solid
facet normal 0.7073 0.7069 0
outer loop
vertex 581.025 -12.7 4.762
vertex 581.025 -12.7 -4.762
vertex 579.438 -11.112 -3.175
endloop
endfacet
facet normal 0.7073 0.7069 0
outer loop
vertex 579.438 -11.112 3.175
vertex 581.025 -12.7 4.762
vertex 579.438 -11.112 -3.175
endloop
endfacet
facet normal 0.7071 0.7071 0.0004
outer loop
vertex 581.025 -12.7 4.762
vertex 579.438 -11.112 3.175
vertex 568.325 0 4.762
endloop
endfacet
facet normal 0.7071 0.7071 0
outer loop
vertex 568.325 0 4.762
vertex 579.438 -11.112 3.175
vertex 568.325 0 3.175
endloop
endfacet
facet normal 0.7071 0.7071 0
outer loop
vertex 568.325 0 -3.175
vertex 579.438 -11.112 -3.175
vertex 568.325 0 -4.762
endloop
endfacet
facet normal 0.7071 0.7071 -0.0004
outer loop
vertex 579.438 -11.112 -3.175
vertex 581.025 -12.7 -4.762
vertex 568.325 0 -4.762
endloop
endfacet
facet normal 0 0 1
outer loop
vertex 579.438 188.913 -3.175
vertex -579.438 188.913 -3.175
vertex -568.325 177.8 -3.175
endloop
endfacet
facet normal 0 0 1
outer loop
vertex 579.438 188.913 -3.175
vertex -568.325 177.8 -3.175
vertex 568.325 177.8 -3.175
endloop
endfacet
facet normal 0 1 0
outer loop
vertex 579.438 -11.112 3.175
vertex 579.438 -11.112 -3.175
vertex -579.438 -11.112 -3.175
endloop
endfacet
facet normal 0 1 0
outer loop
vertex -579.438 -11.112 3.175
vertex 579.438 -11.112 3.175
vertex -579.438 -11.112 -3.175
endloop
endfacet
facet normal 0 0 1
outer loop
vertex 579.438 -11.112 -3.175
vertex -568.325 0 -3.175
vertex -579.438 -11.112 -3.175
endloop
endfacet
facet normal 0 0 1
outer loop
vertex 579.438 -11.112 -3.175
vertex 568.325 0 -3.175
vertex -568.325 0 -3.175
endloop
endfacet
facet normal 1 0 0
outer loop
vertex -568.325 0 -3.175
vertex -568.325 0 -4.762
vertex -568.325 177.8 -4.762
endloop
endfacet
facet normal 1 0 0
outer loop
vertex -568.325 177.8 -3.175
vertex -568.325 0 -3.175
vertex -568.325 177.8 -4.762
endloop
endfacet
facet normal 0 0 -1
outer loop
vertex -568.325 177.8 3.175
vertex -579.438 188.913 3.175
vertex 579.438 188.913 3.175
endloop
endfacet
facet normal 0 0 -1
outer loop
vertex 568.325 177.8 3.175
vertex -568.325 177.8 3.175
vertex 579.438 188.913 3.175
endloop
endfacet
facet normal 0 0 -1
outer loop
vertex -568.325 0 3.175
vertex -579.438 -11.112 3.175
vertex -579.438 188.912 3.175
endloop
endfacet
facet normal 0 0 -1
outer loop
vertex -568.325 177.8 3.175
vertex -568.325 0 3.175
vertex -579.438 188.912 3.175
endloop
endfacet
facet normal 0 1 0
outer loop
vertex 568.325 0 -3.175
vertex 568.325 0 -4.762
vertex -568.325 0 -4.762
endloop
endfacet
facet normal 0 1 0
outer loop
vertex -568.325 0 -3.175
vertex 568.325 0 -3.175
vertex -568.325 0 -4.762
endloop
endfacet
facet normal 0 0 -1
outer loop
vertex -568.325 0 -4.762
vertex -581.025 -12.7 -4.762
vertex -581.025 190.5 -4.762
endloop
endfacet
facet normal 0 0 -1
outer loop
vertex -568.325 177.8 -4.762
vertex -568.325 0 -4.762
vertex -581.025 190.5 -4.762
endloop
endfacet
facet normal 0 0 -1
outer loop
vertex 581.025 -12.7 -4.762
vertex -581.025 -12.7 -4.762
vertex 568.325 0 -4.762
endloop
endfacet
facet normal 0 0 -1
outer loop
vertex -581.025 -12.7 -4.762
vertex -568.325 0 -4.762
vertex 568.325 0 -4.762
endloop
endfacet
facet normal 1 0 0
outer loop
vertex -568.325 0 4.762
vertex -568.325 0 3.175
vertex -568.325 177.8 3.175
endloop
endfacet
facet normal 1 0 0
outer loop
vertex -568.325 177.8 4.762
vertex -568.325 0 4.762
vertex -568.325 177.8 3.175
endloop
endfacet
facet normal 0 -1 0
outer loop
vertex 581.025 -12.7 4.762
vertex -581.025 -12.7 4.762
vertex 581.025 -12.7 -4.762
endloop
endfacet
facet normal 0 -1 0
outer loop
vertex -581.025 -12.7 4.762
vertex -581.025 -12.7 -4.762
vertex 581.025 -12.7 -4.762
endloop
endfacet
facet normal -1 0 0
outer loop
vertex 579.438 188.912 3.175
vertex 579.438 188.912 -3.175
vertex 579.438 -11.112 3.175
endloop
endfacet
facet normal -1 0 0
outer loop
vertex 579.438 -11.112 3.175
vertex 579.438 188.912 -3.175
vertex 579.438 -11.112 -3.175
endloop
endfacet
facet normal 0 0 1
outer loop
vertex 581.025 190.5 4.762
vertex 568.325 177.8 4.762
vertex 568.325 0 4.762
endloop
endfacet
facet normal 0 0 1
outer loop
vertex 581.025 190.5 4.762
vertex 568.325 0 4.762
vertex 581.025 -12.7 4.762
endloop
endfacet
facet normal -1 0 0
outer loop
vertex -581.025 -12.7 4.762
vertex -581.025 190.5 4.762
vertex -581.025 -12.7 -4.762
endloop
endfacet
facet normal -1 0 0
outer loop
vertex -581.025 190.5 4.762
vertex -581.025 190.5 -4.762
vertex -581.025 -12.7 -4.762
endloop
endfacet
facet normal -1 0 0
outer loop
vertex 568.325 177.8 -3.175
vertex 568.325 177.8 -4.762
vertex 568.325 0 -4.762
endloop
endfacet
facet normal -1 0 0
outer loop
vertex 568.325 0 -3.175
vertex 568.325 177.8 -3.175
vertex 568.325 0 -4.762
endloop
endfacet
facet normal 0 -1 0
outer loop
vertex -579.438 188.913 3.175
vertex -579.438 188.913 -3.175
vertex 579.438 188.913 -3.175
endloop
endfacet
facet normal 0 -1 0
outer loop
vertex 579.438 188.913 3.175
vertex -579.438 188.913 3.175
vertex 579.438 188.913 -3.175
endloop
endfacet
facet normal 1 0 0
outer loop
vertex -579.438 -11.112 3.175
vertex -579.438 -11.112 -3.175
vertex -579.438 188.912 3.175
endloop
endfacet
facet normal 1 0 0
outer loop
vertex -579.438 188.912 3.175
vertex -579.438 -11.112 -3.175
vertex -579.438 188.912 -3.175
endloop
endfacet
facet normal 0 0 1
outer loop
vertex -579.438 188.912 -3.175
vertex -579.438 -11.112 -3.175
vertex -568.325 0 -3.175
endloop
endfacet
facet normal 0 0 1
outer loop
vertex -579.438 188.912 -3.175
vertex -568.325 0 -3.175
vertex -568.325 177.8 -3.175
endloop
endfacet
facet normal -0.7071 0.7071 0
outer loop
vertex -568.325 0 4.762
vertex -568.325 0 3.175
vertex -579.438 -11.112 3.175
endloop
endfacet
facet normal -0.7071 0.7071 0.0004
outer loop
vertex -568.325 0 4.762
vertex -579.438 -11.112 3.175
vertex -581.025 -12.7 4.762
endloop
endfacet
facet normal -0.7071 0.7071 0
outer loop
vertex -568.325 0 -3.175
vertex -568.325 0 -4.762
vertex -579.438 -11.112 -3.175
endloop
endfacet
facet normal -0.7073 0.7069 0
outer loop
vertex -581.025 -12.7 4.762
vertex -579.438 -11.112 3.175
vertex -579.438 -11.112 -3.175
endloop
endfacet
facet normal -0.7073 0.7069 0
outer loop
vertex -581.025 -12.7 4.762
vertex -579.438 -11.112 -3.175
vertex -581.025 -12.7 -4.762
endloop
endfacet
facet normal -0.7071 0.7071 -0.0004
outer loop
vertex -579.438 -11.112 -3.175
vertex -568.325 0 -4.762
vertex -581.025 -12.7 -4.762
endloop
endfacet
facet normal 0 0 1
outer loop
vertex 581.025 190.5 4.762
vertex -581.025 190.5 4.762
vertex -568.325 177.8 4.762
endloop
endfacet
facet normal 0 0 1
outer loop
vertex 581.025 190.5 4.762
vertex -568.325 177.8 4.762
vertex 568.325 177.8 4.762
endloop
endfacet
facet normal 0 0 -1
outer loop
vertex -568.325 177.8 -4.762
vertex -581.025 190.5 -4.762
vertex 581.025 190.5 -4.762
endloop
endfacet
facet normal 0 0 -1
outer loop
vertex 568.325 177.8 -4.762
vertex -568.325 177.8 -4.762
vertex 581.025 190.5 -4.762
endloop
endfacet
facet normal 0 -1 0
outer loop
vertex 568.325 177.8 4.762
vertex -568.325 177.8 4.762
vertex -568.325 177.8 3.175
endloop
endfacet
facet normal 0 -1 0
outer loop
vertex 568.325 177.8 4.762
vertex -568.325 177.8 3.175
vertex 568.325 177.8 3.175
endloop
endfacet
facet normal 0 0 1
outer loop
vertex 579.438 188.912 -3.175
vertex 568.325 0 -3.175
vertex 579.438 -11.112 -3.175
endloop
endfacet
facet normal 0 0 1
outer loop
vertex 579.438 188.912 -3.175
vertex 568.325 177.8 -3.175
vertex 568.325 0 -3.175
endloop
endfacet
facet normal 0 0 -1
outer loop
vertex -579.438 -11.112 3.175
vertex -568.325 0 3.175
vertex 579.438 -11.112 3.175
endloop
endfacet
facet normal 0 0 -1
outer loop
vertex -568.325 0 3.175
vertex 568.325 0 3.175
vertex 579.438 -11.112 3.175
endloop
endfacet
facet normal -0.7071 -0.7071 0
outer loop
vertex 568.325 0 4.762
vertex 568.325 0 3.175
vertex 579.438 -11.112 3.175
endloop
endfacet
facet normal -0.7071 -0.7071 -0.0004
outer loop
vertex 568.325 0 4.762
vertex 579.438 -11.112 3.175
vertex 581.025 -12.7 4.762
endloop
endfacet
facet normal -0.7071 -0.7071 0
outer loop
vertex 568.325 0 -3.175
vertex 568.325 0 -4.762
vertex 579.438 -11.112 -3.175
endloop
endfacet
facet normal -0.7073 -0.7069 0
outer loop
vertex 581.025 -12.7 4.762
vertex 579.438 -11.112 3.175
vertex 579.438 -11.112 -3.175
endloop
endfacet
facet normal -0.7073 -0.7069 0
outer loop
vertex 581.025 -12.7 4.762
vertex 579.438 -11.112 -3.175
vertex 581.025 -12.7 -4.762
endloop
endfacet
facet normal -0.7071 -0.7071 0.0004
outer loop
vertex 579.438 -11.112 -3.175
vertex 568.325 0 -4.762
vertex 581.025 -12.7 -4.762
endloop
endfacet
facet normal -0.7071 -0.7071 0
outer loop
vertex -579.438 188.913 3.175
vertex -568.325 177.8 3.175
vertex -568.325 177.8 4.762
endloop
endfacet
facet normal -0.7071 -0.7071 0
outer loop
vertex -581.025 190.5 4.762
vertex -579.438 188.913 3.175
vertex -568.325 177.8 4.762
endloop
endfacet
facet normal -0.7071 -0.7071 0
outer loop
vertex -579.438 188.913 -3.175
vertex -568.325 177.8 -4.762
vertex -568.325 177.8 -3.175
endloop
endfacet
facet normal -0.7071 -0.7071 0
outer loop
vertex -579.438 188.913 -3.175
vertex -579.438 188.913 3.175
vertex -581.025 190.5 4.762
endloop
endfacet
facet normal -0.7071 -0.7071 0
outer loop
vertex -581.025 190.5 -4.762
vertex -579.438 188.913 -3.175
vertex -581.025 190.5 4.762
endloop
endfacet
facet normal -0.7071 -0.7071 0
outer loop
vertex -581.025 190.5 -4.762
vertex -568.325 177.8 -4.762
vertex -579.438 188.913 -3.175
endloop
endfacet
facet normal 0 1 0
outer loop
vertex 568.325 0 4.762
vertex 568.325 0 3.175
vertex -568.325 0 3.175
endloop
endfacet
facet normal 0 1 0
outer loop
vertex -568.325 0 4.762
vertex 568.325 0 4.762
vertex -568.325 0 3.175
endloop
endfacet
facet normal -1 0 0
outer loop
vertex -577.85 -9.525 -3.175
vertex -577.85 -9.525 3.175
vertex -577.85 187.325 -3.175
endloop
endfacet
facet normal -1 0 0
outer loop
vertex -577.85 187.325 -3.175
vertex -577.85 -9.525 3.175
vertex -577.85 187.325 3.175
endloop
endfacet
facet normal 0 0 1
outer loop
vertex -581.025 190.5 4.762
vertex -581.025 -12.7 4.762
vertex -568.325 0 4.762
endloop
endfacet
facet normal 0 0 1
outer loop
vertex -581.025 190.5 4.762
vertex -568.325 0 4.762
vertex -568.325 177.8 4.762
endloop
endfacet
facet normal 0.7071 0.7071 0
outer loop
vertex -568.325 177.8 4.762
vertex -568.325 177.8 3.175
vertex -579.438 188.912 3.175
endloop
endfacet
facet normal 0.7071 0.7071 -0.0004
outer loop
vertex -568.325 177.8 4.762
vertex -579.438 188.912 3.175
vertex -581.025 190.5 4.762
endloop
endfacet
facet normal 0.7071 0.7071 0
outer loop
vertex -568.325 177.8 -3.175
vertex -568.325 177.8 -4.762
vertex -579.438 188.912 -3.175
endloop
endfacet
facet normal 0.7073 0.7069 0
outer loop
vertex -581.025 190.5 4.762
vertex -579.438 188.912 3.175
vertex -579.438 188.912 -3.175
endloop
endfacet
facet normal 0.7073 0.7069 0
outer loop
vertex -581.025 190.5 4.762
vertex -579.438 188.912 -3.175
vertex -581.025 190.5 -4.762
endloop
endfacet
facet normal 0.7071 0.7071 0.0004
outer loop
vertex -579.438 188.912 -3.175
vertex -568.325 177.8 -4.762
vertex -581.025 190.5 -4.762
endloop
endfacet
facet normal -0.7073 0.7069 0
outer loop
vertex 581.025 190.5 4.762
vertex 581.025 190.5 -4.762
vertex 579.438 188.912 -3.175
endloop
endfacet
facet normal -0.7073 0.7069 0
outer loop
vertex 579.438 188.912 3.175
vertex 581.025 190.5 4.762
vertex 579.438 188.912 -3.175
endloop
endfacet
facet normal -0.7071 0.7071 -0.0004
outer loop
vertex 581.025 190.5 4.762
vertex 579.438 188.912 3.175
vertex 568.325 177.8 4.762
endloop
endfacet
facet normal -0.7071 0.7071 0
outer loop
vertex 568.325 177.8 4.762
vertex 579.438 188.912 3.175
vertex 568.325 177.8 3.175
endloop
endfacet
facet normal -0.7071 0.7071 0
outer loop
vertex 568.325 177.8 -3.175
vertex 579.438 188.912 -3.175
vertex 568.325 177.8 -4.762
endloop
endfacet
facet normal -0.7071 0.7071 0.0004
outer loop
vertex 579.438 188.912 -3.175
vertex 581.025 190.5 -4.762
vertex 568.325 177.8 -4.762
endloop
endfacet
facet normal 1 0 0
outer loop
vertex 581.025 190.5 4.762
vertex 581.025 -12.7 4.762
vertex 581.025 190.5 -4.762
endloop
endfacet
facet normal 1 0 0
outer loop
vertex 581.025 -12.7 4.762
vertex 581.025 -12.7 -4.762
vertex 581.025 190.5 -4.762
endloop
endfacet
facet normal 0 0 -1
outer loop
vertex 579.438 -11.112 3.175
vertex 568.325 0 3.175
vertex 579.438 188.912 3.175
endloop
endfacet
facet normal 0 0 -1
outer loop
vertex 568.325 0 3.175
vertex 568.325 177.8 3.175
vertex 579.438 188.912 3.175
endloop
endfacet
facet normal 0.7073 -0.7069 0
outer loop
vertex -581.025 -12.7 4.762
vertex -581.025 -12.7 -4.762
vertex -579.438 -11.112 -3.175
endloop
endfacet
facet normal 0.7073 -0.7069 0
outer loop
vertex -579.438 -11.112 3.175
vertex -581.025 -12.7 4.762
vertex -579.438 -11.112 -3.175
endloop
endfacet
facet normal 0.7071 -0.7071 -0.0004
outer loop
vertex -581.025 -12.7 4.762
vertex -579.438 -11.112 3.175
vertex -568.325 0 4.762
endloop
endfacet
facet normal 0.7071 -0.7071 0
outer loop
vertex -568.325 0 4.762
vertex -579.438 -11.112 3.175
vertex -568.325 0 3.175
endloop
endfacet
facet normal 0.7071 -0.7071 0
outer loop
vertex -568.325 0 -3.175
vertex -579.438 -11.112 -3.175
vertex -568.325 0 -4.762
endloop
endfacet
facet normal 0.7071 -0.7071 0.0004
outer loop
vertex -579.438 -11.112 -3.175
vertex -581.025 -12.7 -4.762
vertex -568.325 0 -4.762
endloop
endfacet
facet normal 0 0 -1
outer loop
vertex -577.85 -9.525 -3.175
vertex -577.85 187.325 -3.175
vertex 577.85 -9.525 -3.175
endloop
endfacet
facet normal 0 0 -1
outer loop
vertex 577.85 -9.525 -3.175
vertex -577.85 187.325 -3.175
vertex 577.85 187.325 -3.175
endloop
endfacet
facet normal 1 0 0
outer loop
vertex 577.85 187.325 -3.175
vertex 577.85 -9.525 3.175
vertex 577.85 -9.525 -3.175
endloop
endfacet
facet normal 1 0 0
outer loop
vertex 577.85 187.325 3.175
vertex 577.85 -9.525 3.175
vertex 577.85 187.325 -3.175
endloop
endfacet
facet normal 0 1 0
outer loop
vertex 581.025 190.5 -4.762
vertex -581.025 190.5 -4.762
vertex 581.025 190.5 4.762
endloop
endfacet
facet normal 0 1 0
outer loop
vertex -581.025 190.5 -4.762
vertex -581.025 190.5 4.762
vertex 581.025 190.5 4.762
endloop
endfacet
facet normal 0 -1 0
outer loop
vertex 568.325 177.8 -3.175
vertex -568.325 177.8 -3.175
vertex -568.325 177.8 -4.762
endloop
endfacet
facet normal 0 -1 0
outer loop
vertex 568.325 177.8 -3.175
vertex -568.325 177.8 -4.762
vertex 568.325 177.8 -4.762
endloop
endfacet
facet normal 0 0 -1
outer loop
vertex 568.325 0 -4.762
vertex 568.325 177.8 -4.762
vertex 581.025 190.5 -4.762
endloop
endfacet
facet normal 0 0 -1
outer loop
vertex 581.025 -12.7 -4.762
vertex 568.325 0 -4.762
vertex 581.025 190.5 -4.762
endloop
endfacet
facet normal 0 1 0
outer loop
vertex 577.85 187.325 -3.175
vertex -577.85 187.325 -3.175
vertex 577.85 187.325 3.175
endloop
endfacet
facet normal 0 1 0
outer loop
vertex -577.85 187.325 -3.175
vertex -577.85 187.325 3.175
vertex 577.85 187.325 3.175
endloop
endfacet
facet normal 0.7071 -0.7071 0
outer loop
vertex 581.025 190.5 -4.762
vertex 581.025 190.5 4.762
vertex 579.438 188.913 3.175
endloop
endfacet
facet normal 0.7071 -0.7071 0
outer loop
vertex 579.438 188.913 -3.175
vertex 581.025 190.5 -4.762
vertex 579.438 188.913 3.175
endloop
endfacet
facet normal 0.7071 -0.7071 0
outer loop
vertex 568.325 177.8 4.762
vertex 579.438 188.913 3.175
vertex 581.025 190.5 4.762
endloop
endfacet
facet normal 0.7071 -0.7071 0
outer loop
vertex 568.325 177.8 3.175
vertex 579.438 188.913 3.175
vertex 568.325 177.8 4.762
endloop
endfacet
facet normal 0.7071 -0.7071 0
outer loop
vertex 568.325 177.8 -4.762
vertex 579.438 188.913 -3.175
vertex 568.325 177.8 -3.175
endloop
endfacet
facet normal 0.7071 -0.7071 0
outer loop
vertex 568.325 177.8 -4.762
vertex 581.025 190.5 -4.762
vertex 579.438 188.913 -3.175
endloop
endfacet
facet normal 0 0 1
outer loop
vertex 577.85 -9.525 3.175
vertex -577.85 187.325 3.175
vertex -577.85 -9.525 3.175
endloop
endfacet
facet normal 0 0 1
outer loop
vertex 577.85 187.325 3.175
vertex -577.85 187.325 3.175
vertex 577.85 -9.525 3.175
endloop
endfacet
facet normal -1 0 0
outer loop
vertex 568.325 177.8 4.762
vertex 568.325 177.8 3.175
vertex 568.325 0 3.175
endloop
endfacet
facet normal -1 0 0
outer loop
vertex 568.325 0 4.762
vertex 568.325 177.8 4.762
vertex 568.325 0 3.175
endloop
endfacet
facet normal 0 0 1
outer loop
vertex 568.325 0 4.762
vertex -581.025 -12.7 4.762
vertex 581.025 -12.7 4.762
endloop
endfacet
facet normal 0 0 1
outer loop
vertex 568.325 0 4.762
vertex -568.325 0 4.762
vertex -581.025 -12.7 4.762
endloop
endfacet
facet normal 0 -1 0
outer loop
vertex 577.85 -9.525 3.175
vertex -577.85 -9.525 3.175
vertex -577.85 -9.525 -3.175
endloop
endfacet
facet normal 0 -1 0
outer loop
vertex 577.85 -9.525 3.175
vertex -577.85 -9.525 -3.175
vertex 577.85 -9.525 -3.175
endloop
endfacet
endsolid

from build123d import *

# Parameters (mm, degrees)
SKETCH2_W               = 1162.05
SKETCH2_H               = 203.2
BOSS_EXTRUDE1_DEPTH     = 4.7625
SKETCH3_W               = 1136.65
SKETCH3_H               = 177.8
CUT_EXTRUDE1_DEPTH      = 612.531705024
CUT_EXTRUDE2_DEPTH      = 3.175
CUT_EXTRUDE2_DEPTH_BACK = 3.175
SKETCH4_W               = 1158.875
SKETCH4_H               = 200.025
SPLIT1_START            = -4.7625
SPLIT1_DEPTH            = 1.5875
SPLIT1_START_2          = 3.175
SPLIT1_2_DEPTH          = 1.5875
SPLIT1_START_3          = -3.175
SPLIT1_3_DEPTH          = 6.35
SPLIT1_4_DEPTH          = 9.525
SPLIT1_5_DEPTH          = 1.5875
SPLIT1_6_DEPTH          = 1.5875
SPLIT1_7_DEPTH          = 6.35
SPLIT1_8_DEPTH          = 1.5875
SPLIT1_9_DEPTH          = 1.5875
SPLIT1_10_DEPTH         = 6.35
SKETCH6_W               = 1155.7
SKETCH6_H               = 196.85
BOSS_EXTRUDE2_DEPTH     = 3.175


# Read off the part's stored shape, not the designer's step: Split1
with BuildPart() as part:
    # Sketch2 → Boss-Extrude1 (new, symmetric)
    with BuildSketch(Plane.XY):
        with Locations((0, 88.9)):
            Rectangle(SKETCH2_W, SKETCH2_H)
    extrude(amount=BOSS_EXTRUDE1_DEPTH, both=True)

    # Sketch3 → Cut-Extrude1 (cut, through all)
    with BuildSketch(Plane.XY.offset(4.7625)):
        with Locations((0, 88.9)):
            Rectangle(SKETCH3_W, SKETCH3_H)
    extrude(amount=-CUT_EXTRUDE1_DEPTH, mode=Mode.SUBTRACT)

    # Sketch4 → Cut-Extrude2 (cut, two sides: drawn at the far end of the back side and taken through both)
    with BuildSketch(Plane.XY.offset(-CUT_EXTRUDE2_DEPTH_BACK)):
        with Locations((0, 88.9)):
            Rectangle(SKETCH4_W, SKETCH4_H)
    extrude(amount=CUT_EXTRUDE2_DEPTH + CUT_EXTRUDE2_DEPTH_BACK, mode=Mode.SUBTRACT)

    # Split1 4 outline → Split1 4 (cut)
    with BuildSketch(Plane.XY.offset(SPLIT1_START)):
        Polygon((581.025, -12.7), (581.025, 190.5), (568.325, 177.8), (568.325, 0), (-568.325, 0), (-568.325, 177.8), (-581.025, 190.5), (-581.025, -12.7), align=None)
    extrude(amount=SPLIT1_4_DEPTH, mode=Mode.SUBTRACT)


with BuildPart() as body_2:
    # Split1 outline → Split1 (new body)
    with BuildSketch(Plane.XY.offset(SPLIT1_START)):
        Polygon((-581.025, 190.5), (-581.025, -12.7), (-568.325, 0), (-568.325, 177.8), align=None)
    extrude(amount=SPLIT1_DEPTH)

    # Split1 2 outline → Split1 2 (add)
    with BuildSketch(Plane.XY.offset(SPLIT1_START_2)):
        Polygon((-581.025, 190.5), (-581.025, -12.7), (-568.325, 0), (-568.325, 177.8), align=None)
    extrude(amount=SPLIT1_2_DEPTH)

    # Split1 3 outline → Split1 3 (add)
    with BuildSketch(Plane.XY.offset(SPLIT1_START_3)):
        Polygon((-579.4375, 188.9125), (-581.025, 190.5), (-581.025, -12.7), (-579.4375, -11.1125), align=None)
    extrude(amount=SPLIT1_3_DEPTH)


with BuildPart() as body_3:
    # Split1 5 outline → Split1 5 (new body)
    with BuildSketch(Plane.XY.offset(SPLIT1_START)):
        Polygon((581.025, -12.7), (581.025, 190.5), (568.325, 177.8), (568.325, 0), align=None)
    extrude(amount=SPLIT1_5_DEPTH)

    # Split1 6 outline → Split1 6 (add)
    with BuildSketch(Plane.XY.offset(SPLIT1_START_2)):
        Polygon((581.025, -12.7), (581.025, 190.5), (568.325, 177.8), (568.325, 0), align=None)
    extrude(amount=SPLIT1_6_DEPTH)

    # Split1 7 outline → Split1 7 (add)
    with BuildSketch(Plane.XY.offset(SPLIT1_START_3)):
        Polygon((579.4375, -11.1125), (581.025, -12.7), (581.025, 190.5), (579.4375, 188.9125), align=None)
    extrude(amount=SPLIT1_7_DEPTH)


with BuildPart() as body_4:
    # Split1 8 outline → Split1 8 (new body)
    with BuildSketch(Plane.XY.offset(SPLIT1_START)):
        Polygon((-581.025, -12.7), (581.025, -12.7), (568.325, 0), (-568.325, 0), align=None)
    extrude(amount=SPLIT1_8_DEPTH)

    # Split1 9 outline → Split1 9 (add)
    with BuildSketch(Plane.XY.offset(SPLIT1_START_2)):
        Polygon((-581.025, -12.7), (581.025, -12.7), (568.325, 0), (-568.325, 0), align=None)
    extrude(amount=SPLIT1_9_DEPTH)

    # Split1 10 outline → Split1 10 (add)
    with BuildSketch(Plane.XY.offset(SPLIT1_START_3)):
        Polygon((-579.4375, -11.1125), (-581.025, -12.7), (581.025, -12.7), (579.4375, -11.1125), align=None)
    extrude(amount=SPLIT1_10_DEPTH)


with BuildPart() as body_5:
    # Sketch6 → Boss-Extrude2 (new, symmetric)
    with BuildSketch(Plane.XY):
        with Locations((0, 88.9)):
            Rectangle(SKETCH6_W, SKETCH6_H)
    extrude(amount=BOSS_EXTRUDE2_DEPTH, both=True)


solid = Compound([part.part, body_2.part, body_3.part, body_4.part, body_5.part])
